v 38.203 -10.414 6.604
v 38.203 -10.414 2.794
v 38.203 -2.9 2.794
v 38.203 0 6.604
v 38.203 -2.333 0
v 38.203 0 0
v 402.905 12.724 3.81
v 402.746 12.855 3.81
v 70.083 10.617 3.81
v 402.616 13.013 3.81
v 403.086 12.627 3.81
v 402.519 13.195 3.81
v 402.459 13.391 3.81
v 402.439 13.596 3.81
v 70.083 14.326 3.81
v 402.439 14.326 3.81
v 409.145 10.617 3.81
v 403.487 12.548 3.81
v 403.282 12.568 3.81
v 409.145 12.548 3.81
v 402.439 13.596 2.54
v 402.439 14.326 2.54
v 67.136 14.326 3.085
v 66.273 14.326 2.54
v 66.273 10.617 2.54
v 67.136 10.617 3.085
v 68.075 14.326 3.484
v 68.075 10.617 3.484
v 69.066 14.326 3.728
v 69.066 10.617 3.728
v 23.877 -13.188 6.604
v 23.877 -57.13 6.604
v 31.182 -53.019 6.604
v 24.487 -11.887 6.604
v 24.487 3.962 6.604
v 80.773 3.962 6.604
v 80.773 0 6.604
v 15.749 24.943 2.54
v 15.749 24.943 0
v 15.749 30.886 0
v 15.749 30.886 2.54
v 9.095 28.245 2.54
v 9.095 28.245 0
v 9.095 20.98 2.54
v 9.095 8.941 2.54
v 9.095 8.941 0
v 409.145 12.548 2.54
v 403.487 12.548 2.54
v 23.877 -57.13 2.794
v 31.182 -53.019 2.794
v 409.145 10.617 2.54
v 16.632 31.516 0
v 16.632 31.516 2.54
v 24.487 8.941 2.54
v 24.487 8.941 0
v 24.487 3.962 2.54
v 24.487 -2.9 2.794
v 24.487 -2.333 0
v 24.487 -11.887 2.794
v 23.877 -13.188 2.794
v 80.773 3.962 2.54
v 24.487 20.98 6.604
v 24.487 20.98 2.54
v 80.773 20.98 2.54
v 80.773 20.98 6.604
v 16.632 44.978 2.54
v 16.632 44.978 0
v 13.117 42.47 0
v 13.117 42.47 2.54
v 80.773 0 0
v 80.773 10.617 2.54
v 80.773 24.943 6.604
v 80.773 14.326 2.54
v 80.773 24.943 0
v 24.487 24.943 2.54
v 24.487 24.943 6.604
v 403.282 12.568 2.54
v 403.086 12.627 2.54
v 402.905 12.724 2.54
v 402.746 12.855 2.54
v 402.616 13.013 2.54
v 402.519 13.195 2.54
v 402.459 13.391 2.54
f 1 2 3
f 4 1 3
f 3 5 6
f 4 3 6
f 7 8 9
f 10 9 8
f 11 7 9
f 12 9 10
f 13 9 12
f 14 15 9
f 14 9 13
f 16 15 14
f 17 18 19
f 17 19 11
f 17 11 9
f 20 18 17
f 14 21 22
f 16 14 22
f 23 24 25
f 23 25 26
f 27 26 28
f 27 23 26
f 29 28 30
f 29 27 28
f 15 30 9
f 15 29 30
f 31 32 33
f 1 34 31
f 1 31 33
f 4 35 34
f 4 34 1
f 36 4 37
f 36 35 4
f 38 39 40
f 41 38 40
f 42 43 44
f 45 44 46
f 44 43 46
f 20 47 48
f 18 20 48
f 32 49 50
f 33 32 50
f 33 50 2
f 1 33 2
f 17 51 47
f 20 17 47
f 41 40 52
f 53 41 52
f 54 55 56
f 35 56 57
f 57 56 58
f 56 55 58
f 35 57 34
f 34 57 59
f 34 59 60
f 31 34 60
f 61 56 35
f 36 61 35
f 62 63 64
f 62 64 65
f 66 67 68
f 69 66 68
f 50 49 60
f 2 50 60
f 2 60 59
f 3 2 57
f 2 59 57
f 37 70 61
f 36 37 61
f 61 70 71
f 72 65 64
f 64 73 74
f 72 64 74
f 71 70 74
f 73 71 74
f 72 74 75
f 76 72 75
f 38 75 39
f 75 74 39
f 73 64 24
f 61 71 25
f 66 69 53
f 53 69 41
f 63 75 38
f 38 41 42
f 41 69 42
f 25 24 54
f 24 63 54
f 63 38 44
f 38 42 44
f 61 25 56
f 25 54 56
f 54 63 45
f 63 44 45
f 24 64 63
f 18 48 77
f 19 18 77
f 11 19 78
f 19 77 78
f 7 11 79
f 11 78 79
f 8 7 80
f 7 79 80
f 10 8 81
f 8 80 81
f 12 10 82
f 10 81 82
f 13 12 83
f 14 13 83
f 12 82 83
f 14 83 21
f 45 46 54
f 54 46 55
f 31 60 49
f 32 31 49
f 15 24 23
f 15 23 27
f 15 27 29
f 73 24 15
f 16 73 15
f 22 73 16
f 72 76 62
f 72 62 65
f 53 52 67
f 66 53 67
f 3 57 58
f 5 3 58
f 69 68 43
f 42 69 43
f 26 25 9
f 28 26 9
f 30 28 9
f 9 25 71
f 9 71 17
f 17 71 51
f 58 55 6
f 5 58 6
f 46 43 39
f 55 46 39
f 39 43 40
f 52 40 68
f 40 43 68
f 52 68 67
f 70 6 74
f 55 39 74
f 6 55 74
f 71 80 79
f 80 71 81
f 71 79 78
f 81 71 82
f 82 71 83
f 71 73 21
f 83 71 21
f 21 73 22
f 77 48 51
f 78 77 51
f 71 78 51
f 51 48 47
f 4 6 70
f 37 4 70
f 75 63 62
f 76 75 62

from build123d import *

# Parameters (mm, degrees)
F2_DEPTH     = 6.604
F4_W         = 17.018
F4_H         = 5.5950877881
F5_DEPTH     = 71.6798
F6_W         = 16.355678454
F6_H         = 4.3095059386
F7_DEPTH     = 44.9793598678
F9_DEPTH     = 56.897
F10_W        = 342.8717973226
F10_H        = 3.7084
F11_DEPTH    = 1.27
F12_T1_DEPTH = 3.7084
F14_DEPTH    = 4.065


# Not quite as in the source:
# - a fillet or chamfer that OpenCascade refuses, or shapes differently, is made with other operations: its cross-section is extruded or revolved along the edge and cut away or added


with BuildPart() as f2:
    # F1 (on Top) → F2 (new body)
    with BuildSketch(Plane.XY):
        Polygon((80.7733850724, 0), (80.7733850724, 24.9428), (15.7493850724, 24.9428), (15.7493850724, 30.8864), (16.6319306082, 31.5163598678), (16.6319306082, 44.9783598678), (13.1174201358, 42.4697068149), (9.0945850724, 28.2448), (9.0945850724, 8.9408), (24.4869850724, 8.9408), (24.4869850724, -11.8872), (23.8773850724, -13.1876401322), (23.8773850724, -57.1296401322), (31.1824725433, -53.0194550947), (38.2029850724, -10.414), (38.2029850724, 0), align=None)
    extrude(amount=F2_DEPTH)

    # F4 (on face) → F5 (cut, through all)
    with BuildSketch(Plane(origin=(9.0945850724, 0, 0), x_dir=(0, -1, 0), z_dir=(-1, 0, 0))):
        with Locations((-12.4714, 5.3375438941)):
            Rectangle(F4_W, F4_H)
    extrude(amount=-F5_DEPTH, mode=Mode.SUBTRACT)

    # F6 (on Front) → F7 (cut, through all)
    with BuildSketch(Plane.XZ):
        with Locations((16.3091458454, 4.6947529693)):
            Rectangle(F6_W, F6_H)
    extrude(amount=-F7_DEPTH, mode=Mode.SUBTRACT)

    # F8 (on face) → F9 (cut, through all)
    with BuildSketch(Plane(origin=(23.8773850724, 0, 0), x_dir=(0, -1, 0), z_dir=(-1, 0, 0))):
        Polygon((57.1296401322, -1.4798081247), (57.1296401322, 2.794), (2.9003161471, 2.794), (2.032, -1.4798081247), align=None)
    extrude(amount=-F9_DEPTH, mode=Mode.SUBTRACT)

    # F10 (on face) → F11 (join)
    with BuildSketch(Plane.XY.offset(2.54)):
        with Locations((237.7086864111, 12.4714)):
            Rectangle(F10_W, F10_H)
    extrude(amount=F11_DEPTH)

    # F12: fillet of radius 6.35 on 1 edges, made by hand

    # F12_s2 → F12_t1 (cut)
    with BuildSketch(Plane.XZ.offset(-14.3256)):
        with BuildLine():
            ThreePointArc((66.2727877498, 2.54), (68.0747414356, 3.4841389426), (70.0827877498, 3.81))
            Line((70.0827877498, 3.81), (66.2727877498, 3.81))
            Line((66.2727877498, 3.81), (66.2727877498, 2.54))
        make_face()
    extrude(amount=F12_T1_DEPTH, mode=Mode.SUBTRACT)

    # F13 (on face) → F14 (cut, through all)
    with BuildSketch(Plane(origin=(0, 0, 2.54), x_dir=(1, 0, 0), z_dir=(0, 0, -1))):
        with BuildLine():
            ThreePointArc((403.4869184795, -12.5476), (402.7459176611, -12.8545325887), (402.4389850724, -13.5955334071))
            Line((402.4389850724, -13.5955334071), (402.4389850724, -14.3256))
            Line((402.4389850724, -14.3256), (409.480124712, -15.0942075998))
            Line((409.480124712, -15.0942075998), (409.1445850724, -12.5476))
            Line((409.1445850724, -12.5476), (403.4869184795, -12.5476))
        make_face()
    extrude(amount=-F14_DEPTH, mode=Mode.SUBTRACT)


solid = f2.part
